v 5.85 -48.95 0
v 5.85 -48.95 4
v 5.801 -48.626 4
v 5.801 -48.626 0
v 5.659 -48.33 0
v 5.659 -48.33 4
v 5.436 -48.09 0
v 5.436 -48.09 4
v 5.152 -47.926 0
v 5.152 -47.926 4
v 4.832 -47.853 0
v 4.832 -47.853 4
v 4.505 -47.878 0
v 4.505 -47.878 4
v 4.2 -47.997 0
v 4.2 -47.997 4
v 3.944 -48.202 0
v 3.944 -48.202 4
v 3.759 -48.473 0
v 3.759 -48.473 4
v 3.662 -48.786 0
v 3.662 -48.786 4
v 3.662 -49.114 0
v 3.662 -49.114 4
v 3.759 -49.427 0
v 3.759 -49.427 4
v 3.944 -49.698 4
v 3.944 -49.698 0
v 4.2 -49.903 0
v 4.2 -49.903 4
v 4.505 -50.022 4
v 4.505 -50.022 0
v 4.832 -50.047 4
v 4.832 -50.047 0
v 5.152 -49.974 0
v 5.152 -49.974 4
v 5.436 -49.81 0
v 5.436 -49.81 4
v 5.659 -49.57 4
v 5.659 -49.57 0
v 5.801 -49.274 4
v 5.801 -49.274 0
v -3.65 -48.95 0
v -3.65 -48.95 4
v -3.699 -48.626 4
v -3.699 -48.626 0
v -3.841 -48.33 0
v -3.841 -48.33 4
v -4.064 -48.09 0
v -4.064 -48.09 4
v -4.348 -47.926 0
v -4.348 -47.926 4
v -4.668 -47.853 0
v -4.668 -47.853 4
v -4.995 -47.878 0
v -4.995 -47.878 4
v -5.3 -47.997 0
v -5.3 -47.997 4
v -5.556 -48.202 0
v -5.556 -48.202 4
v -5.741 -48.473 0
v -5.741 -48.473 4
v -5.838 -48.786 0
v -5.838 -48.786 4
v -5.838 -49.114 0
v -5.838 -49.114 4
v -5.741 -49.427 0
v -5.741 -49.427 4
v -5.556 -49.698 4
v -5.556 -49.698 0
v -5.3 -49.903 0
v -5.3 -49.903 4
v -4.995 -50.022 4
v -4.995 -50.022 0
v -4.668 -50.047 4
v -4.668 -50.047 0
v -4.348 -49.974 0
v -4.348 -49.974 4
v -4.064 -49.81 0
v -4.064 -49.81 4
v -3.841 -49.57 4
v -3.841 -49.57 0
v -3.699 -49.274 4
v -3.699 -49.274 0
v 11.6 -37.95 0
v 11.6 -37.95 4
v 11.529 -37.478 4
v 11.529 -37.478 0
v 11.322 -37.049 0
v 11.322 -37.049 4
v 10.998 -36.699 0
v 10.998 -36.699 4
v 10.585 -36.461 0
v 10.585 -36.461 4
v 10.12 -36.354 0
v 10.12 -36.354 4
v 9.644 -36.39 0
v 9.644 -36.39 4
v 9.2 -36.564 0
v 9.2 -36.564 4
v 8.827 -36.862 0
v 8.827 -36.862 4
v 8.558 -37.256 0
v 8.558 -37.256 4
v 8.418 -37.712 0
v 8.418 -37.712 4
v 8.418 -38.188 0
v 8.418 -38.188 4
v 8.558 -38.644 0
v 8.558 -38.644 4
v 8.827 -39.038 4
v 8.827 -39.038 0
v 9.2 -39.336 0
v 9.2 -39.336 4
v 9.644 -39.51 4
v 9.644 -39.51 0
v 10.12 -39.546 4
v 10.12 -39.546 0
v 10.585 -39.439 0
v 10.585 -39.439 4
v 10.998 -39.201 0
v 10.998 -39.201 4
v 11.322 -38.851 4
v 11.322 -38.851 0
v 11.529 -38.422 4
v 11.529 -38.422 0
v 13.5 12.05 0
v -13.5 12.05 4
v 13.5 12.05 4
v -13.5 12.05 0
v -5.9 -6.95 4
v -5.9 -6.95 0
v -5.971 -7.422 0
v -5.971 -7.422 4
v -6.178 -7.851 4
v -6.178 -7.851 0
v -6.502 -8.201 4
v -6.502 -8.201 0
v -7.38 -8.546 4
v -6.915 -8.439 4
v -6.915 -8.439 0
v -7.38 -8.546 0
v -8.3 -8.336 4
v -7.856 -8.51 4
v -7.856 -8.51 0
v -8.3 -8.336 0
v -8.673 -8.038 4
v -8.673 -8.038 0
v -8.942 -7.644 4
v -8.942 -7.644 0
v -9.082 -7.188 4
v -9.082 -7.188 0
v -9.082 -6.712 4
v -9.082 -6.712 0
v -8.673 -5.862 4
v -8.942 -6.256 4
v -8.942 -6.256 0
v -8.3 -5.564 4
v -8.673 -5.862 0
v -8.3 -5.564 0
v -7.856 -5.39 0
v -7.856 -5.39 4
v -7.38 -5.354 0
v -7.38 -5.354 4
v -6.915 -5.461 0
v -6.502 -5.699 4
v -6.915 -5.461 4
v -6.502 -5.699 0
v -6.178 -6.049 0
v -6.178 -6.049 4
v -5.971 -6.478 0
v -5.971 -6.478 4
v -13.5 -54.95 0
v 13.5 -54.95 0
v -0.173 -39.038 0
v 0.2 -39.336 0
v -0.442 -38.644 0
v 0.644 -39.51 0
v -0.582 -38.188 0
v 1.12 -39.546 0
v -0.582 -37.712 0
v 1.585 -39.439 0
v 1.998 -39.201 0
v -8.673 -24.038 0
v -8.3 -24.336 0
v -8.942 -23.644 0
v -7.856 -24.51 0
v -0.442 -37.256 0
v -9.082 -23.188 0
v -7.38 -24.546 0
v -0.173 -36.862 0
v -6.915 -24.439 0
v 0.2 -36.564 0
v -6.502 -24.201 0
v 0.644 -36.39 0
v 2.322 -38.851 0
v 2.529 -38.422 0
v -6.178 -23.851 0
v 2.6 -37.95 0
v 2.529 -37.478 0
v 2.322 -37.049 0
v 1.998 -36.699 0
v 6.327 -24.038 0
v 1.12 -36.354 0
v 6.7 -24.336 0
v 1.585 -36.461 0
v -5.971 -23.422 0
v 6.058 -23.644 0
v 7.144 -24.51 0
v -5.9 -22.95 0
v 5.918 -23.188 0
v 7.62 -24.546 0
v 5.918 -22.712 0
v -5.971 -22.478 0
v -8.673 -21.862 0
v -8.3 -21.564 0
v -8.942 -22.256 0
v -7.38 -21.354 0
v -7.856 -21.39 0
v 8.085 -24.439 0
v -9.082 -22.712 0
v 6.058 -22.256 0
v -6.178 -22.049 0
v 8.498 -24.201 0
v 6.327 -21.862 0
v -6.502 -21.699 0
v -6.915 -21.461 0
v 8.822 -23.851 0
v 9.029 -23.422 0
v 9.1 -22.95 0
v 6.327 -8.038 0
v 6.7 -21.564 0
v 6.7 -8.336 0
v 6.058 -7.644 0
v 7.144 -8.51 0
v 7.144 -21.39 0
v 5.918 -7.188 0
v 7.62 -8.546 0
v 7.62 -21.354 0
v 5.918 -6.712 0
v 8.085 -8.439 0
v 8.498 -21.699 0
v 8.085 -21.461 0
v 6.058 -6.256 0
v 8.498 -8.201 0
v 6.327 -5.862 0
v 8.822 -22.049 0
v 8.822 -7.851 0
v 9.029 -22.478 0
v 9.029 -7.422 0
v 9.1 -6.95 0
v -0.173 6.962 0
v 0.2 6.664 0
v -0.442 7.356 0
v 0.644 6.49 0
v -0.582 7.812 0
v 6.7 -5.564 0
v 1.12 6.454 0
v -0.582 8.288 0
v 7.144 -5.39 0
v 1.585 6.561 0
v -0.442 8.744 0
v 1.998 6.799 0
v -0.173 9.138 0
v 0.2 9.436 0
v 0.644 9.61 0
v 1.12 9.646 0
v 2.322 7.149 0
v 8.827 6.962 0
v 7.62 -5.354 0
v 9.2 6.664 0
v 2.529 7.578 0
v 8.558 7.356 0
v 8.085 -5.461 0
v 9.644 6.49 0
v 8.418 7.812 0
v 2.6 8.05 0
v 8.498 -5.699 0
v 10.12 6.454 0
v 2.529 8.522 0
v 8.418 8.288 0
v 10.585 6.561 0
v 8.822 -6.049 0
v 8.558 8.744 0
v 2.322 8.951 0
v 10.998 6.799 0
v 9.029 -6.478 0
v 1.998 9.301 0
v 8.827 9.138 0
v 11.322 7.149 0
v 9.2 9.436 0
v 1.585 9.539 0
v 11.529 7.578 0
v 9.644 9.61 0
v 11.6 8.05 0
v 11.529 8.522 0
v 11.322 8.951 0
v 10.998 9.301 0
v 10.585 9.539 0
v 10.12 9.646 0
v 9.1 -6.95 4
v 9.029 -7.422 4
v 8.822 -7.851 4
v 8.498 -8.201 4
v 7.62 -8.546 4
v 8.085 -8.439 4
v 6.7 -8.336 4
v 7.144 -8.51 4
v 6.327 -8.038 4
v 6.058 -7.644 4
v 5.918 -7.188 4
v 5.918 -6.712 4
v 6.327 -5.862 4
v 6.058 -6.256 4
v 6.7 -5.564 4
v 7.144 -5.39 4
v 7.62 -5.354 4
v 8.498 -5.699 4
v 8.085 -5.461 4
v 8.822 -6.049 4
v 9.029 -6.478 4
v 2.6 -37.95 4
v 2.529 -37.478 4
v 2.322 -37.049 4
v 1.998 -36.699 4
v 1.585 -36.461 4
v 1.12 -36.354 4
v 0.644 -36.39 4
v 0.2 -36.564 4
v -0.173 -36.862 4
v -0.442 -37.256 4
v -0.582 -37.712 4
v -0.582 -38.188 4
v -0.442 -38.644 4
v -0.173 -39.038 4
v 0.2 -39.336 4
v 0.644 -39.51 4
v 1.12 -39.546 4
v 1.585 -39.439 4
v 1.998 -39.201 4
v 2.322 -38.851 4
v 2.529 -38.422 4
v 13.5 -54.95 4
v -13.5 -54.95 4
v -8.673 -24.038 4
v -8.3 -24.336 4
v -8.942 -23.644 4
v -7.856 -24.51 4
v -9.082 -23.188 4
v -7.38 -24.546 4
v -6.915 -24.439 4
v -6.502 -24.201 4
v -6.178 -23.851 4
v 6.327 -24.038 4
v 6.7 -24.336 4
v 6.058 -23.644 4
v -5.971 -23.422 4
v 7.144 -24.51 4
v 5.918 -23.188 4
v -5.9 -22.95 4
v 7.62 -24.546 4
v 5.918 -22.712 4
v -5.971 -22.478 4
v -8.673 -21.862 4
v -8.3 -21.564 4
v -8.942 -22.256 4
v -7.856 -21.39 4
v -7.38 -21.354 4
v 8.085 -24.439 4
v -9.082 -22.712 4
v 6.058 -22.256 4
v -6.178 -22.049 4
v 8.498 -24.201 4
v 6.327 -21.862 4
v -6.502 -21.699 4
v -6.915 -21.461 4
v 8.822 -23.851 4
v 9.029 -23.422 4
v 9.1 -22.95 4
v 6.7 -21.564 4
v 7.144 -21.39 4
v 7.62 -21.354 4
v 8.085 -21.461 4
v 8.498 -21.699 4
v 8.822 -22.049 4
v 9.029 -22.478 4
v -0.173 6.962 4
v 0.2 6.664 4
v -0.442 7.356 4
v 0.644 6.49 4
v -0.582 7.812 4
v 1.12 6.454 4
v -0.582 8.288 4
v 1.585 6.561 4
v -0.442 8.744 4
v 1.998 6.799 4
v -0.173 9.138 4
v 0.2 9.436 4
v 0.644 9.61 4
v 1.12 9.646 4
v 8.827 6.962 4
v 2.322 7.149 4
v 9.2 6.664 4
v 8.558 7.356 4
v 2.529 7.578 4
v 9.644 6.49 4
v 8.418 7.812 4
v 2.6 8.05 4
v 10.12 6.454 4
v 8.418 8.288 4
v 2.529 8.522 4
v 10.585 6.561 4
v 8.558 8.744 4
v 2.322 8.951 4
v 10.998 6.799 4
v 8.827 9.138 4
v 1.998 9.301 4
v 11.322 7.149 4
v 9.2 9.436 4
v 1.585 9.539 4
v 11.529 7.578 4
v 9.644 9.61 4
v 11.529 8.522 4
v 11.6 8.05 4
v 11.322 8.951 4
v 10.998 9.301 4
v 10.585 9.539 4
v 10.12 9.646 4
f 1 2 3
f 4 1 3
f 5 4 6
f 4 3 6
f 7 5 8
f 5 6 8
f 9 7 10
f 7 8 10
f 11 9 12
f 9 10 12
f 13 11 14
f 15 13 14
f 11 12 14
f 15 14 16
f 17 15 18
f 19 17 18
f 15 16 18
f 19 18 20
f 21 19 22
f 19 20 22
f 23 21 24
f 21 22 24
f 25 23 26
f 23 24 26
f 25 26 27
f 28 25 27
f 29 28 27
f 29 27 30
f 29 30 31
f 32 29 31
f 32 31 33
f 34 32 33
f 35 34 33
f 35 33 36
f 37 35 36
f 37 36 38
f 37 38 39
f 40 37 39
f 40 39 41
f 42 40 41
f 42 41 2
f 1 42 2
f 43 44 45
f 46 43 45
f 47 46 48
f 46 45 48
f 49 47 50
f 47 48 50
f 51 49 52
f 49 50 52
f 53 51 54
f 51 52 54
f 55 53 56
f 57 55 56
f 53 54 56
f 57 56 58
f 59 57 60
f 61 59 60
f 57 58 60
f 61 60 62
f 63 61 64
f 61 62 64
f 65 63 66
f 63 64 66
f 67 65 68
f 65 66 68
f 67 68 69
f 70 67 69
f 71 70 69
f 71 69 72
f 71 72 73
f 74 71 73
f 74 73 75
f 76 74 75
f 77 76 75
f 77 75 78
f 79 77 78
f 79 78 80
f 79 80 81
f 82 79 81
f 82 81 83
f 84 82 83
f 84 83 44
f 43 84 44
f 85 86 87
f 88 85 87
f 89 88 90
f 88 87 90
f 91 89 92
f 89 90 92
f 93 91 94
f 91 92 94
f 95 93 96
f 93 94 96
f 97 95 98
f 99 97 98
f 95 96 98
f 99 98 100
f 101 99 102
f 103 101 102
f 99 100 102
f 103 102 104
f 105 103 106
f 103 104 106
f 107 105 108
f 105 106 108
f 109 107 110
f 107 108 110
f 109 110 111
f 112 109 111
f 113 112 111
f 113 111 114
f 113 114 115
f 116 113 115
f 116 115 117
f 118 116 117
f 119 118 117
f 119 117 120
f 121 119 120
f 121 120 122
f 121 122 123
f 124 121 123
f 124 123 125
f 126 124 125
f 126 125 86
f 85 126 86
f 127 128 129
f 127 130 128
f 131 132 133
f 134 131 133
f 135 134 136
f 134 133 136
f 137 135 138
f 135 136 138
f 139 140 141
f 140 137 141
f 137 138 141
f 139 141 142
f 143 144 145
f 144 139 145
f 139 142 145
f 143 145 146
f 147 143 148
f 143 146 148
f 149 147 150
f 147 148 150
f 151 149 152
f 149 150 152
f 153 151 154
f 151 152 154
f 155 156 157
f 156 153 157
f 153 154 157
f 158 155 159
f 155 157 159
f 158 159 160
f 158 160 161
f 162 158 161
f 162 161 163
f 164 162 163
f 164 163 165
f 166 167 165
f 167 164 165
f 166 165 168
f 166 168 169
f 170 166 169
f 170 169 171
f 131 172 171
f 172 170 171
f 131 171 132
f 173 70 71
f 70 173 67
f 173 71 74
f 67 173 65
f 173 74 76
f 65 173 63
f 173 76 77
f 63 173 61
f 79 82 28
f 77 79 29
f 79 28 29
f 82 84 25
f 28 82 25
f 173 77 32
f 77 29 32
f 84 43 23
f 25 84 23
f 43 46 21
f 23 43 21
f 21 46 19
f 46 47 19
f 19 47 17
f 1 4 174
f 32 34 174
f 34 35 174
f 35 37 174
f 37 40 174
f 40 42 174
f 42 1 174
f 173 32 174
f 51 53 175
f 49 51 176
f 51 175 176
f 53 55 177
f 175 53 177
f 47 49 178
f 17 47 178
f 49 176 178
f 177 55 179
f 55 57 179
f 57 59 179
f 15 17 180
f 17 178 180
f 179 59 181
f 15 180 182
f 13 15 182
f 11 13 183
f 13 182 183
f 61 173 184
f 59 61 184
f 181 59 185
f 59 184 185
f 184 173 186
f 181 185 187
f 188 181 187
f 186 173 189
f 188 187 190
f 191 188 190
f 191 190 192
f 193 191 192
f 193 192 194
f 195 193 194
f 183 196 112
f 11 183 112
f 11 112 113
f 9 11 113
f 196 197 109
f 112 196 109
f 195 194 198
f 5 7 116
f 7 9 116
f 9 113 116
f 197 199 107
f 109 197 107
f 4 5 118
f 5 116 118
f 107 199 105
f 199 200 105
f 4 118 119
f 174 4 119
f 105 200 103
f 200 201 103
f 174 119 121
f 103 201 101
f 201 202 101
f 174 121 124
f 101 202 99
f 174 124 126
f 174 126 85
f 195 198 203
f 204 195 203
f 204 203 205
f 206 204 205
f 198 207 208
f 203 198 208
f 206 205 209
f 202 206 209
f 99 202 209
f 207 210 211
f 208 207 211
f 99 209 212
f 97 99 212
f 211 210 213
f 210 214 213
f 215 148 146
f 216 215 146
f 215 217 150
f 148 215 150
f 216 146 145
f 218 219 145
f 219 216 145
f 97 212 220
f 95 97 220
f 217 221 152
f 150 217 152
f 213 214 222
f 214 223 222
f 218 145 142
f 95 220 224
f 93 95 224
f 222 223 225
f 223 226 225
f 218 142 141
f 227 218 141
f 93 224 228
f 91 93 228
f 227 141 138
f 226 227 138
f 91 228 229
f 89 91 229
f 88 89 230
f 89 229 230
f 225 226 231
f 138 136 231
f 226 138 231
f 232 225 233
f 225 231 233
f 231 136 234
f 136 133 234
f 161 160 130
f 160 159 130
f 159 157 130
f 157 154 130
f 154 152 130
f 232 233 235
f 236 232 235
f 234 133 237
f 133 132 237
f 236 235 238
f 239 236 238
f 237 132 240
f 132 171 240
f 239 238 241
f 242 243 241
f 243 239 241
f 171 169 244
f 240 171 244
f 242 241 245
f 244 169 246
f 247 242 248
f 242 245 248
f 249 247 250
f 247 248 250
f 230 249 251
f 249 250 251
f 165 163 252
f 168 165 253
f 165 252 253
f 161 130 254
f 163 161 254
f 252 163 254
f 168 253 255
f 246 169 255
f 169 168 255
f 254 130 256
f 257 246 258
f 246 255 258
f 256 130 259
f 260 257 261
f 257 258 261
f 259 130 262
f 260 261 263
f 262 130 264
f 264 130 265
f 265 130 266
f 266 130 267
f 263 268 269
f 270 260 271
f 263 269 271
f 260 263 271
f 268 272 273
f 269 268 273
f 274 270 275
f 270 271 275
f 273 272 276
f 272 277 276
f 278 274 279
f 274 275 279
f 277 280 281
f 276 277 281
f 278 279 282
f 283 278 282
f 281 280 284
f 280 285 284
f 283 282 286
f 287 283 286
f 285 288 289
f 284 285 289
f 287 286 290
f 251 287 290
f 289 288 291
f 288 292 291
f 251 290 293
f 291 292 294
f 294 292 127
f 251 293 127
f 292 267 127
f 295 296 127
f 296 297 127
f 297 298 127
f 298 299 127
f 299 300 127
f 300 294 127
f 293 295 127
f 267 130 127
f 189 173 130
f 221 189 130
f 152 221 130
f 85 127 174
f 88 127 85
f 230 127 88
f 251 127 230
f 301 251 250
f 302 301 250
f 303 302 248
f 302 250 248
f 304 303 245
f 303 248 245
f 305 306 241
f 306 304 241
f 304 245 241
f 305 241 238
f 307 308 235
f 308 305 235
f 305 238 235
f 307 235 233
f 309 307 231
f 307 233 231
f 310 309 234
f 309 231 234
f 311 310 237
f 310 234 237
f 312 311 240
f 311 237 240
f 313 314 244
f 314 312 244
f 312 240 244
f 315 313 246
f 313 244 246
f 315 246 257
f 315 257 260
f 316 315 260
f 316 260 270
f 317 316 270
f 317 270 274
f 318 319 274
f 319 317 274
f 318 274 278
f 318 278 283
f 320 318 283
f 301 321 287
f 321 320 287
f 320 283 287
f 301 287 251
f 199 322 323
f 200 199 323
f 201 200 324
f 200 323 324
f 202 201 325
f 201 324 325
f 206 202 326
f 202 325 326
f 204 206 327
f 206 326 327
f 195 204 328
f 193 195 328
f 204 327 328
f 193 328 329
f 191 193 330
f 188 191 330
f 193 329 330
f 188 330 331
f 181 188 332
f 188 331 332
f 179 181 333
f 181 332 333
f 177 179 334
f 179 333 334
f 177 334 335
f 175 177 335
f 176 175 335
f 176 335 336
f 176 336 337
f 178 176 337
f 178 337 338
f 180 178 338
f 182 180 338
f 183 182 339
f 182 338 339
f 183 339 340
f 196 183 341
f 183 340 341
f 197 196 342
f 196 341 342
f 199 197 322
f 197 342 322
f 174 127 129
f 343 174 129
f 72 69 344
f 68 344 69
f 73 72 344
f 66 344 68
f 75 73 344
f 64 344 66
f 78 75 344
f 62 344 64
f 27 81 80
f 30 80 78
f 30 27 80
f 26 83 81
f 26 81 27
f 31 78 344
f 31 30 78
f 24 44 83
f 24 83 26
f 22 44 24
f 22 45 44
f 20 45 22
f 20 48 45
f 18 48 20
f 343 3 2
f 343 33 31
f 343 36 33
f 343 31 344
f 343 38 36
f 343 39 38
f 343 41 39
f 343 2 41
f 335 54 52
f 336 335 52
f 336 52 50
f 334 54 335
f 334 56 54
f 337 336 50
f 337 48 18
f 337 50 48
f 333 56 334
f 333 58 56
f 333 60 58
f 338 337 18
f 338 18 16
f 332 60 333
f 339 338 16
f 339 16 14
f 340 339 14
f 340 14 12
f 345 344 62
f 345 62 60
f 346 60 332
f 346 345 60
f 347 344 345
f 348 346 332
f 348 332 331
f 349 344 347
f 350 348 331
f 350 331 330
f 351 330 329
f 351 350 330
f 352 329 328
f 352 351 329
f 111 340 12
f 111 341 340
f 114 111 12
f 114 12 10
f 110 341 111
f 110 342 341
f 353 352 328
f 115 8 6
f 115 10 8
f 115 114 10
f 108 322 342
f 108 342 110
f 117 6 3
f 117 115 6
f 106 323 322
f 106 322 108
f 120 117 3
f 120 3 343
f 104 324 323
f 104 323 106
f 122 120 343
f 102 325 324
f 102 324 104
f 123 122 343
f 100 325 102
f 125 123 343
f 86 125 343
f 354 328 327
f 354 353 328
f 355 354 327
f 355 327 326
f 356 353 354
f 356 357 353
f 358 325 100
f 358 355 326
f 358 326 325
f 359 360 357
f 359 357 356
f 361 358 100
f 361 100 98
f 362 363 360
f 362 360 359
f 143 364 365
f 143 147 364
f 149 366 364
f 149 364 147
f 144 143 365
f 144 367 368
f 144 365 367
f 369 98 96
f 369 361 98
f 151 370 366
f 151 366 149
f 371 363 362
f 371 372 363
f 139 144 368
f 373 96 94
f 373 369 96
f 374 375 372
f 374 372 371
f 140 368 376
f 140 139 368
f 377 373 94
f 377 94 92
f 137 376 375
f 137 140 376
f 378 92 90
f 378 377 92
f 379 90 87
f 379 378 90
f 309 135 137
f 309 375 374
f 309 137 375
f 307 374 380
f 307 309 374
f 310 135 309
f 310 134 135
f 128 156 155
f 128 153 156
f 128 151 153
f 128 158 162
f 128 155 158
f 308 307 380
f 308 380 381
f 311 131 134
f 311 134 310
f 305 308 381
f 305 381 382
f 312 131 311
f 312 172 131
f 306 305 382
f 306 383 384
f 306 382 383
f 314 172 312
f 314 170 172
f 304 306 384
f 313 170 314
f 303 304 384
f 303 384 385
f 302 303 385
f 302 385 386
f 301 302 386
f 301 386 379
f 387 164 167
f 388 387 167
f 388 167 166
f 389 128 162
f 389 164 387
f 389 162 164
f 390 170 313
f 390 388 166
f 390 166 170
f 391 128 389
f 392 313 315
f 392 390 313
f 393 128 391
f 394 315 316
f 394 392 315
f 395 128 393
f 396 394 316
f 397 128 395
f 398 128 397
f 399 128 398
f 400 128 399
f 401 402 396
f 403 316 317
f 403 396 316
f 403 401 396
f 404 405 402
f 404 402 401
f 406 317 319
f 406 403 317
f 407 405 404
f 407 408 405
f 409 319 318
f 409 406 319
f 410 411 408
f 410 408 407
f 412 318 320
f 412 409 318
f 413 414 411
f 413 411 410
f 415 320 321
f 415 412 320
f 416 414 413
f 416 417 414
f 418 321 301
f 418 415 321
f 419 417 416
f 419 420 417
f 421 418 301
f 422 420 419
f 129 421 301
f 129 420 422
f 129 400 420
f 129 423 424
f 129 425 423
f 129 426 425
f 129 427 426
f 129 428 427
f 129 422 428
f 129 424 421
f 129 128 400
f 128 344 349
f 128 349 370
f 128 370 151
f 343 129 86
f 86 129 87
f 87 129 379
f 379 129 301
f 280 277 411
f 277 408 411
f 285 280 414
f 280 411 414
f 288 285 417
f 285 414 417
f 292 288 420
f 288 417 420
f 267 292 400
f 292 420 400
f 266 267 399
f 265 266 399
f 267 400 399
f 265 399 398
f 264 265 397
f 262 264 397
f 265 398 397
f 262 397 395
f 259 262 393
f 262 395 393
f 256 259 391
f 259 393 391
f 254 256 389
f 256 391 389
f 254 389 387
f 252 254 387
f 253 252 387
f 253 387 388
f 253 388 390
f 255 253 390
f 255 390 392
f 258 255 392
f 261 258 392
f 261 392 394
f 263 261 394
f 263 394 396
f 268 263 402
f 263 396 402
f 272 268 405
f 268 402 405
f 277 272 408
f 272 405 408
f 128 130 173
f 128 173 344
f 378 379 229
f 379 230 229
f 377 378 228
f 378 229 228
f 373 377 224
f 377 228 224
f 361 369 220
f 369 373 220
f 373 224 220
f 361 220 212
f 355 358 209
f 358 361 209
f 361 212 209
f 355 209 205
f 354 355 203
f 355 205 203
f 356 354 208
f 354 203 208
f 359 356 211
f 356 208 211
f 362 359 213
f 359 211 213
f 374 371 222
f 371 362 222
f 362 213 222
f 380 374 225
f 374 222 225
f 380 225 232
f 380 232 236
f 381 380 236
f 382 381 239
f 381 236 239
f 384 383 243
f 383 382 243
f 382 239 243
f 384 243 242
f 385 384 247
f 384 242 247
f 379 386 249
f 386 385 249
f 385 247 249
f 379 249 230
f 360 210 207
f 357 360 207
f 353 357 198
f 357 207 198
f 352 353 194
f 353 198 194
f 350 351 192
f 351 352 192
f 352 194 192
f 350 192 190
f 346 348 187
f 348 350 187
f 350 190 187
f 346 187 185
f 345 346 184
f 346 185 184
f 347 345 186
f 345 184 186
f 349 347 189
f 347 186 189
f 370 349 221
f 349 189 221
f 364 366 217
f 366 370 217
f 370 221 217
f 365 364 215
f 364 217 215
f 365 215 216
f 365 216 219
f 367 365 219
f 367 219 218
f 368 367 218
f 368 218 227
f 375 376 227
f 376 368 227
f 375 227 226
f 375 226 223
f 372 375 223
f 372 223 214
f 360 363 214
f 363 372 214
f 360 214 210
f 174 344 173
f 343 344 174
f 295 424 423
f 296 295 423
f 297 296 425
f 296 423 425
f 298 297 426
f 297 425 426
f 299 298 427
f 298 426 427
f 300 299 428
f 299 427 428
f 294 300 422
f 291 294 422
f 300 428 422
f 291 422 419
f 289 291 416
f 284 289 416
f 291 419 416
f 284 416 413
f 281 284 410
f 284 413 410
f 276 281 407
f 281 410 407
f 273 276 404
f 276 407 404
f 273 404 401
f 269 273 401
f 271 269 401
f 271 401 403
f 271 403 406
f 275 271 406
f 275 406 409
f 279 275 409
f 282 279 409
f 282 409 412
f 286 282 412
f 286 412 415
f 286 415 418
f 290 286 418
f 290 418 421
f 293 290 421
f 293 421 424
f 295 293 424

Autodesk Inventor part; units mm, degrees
ref_plane "YZ Plane" through (0, 0, 0) normal (1, 0, 0) x (0, 1, 0)
ref_plane "XZ Plane" through (0, 0, 0) normal (0, 1, 0) x (-1, 0, 0)
ref_plane "XY Plane" through (0, 0, 0) normal (0, 0, 1) x (1, 0, 0)
sketch "Эскиз1" plane through (0, 0, 0) normal (0, 0, 1) x (1, 0, 0)
  circle A0 centre (-7.5, -6.95) radius 1.5 construction
  circle A1 centre (7.5, -6.95) radius 1.5 construction
  circle A2 centre (7.5, -22.95) radius 1.5 construction
  circle A3 centre (-7.5, -22.95) radius 1.5 construction
  circle A4 centre (-7.5, -6.95) radius 1.6
  circle A5 centre (7.5, -6.95) radius 1.6
  circle A6 centre (7.5, -22.95) radius 1.6
  circle A7 centre (-7.5, -22.95) radius 1.6
  line L0 (9, 4.1) -> (-9, 4.1) construction
  line L1 (9, -34) -> (-9, -34) construction
  line L2 (-13.5, 12.05) -> (13.5, 12.05)
  line L3 (13.5, 12.05) -> (13.5, -41.95)
  line L4 (13.5, -41.95) -> (-13.5, -41.95)
  line L5 (-13.5, -41.95) -> (-13.5, 12.05)
  line L6 (-7.5, -6.95) -> (-7.5, 12.05) construction
  line L7 (-7.5, -22.95) -> (-7.5, -41.95) construction
  point P0 (0, 0)
  dimension "d0" = 3.2
  dimension "d1" = 3.2
  dimension "d2" = 3.2
  dimension "d3" = 3.2
  dimension "d4" = 6
  dimension "d5" = 6
  dimension "d8" = 54
extrude "Выдавливание1" add sketch "Эскиз1" along normal blind 4
sketch "Эскиз3" plane through (0, 0, 4) normal (0, 0, 1) x (1, 0, 0)
  circle A0 centre (1, -37.95) radius 2.1 construction
  circle A1 centre (10, -37.95) radius 2.1 construction
  circle A2 centre (1, 8.05) radius 2.1 construction
  circle A3 centre (10, 8.05) radius 2.1 construction
  circle A4 centre (1, -37.95) radius 1.6
  circle A5 centre (10, -37.95) radius 1.6
  circle A6 centre (1, 8.05) radius 1.6
  circle A7 centre (10, 8.05) radius 1.6
  point P0 (0, 0)
  dimension "d9" = 3.2
  dimension "d10" = 3.2
  dimension "d11" = 3.2
  dimension "d12" = 3.2
extrude "Выдавливание2" cut sketch "Эскиз3" against normal blind 10
sketch "Эскиз4" plane through (-13.5, -41.95, 0) normal (0, -1, 0) x (1, 0, 0)
  line L0 (0, 4) -> (27, 4) projected
  line L1 (0, 0) -> (0, 4) projected
  line L2 (0, 0) -> (27, 0) projected
  line L3 (27, 0) -> (27, 4) projected
  point P0 (13.5, 0)
extrude "Выдавливание3" add sketch "Эскиз4" along normal blind 13
sketch "Эскиз5" plane through (0, 0, 4) normal (0, 0, 1) x (1, 0, 0)
  circle A0 centre (-4.75, -48.95) radius 1.1
  circle A1 centre (4.75, -48.95) radius 1.1
  line L0 (13.5, -54.95) -> (-13.5, -54.95) projected
  line L1 (-4.75, -48.95) -> (4.75, -48.95) construction
  line L2 (-13.5, -54.95) -> (13.5, -54.95) projected
  line L3 (0, -54.95) -> (0, -44.9409) construction
  point P0 (0, 0)
  point P1 (0, -48.95)
  dimension "d17" = 2.2
  dimension "d18" = 2.2
  dimension "d19" = 6
  dimension "d20" = 6
  dimension "d21" = 9.5
extrude "Выдавливание4" cut sketch "Эскиз5" against normal blind 13
properties part number "фанера_каретка" material "Древесина (береза)"
